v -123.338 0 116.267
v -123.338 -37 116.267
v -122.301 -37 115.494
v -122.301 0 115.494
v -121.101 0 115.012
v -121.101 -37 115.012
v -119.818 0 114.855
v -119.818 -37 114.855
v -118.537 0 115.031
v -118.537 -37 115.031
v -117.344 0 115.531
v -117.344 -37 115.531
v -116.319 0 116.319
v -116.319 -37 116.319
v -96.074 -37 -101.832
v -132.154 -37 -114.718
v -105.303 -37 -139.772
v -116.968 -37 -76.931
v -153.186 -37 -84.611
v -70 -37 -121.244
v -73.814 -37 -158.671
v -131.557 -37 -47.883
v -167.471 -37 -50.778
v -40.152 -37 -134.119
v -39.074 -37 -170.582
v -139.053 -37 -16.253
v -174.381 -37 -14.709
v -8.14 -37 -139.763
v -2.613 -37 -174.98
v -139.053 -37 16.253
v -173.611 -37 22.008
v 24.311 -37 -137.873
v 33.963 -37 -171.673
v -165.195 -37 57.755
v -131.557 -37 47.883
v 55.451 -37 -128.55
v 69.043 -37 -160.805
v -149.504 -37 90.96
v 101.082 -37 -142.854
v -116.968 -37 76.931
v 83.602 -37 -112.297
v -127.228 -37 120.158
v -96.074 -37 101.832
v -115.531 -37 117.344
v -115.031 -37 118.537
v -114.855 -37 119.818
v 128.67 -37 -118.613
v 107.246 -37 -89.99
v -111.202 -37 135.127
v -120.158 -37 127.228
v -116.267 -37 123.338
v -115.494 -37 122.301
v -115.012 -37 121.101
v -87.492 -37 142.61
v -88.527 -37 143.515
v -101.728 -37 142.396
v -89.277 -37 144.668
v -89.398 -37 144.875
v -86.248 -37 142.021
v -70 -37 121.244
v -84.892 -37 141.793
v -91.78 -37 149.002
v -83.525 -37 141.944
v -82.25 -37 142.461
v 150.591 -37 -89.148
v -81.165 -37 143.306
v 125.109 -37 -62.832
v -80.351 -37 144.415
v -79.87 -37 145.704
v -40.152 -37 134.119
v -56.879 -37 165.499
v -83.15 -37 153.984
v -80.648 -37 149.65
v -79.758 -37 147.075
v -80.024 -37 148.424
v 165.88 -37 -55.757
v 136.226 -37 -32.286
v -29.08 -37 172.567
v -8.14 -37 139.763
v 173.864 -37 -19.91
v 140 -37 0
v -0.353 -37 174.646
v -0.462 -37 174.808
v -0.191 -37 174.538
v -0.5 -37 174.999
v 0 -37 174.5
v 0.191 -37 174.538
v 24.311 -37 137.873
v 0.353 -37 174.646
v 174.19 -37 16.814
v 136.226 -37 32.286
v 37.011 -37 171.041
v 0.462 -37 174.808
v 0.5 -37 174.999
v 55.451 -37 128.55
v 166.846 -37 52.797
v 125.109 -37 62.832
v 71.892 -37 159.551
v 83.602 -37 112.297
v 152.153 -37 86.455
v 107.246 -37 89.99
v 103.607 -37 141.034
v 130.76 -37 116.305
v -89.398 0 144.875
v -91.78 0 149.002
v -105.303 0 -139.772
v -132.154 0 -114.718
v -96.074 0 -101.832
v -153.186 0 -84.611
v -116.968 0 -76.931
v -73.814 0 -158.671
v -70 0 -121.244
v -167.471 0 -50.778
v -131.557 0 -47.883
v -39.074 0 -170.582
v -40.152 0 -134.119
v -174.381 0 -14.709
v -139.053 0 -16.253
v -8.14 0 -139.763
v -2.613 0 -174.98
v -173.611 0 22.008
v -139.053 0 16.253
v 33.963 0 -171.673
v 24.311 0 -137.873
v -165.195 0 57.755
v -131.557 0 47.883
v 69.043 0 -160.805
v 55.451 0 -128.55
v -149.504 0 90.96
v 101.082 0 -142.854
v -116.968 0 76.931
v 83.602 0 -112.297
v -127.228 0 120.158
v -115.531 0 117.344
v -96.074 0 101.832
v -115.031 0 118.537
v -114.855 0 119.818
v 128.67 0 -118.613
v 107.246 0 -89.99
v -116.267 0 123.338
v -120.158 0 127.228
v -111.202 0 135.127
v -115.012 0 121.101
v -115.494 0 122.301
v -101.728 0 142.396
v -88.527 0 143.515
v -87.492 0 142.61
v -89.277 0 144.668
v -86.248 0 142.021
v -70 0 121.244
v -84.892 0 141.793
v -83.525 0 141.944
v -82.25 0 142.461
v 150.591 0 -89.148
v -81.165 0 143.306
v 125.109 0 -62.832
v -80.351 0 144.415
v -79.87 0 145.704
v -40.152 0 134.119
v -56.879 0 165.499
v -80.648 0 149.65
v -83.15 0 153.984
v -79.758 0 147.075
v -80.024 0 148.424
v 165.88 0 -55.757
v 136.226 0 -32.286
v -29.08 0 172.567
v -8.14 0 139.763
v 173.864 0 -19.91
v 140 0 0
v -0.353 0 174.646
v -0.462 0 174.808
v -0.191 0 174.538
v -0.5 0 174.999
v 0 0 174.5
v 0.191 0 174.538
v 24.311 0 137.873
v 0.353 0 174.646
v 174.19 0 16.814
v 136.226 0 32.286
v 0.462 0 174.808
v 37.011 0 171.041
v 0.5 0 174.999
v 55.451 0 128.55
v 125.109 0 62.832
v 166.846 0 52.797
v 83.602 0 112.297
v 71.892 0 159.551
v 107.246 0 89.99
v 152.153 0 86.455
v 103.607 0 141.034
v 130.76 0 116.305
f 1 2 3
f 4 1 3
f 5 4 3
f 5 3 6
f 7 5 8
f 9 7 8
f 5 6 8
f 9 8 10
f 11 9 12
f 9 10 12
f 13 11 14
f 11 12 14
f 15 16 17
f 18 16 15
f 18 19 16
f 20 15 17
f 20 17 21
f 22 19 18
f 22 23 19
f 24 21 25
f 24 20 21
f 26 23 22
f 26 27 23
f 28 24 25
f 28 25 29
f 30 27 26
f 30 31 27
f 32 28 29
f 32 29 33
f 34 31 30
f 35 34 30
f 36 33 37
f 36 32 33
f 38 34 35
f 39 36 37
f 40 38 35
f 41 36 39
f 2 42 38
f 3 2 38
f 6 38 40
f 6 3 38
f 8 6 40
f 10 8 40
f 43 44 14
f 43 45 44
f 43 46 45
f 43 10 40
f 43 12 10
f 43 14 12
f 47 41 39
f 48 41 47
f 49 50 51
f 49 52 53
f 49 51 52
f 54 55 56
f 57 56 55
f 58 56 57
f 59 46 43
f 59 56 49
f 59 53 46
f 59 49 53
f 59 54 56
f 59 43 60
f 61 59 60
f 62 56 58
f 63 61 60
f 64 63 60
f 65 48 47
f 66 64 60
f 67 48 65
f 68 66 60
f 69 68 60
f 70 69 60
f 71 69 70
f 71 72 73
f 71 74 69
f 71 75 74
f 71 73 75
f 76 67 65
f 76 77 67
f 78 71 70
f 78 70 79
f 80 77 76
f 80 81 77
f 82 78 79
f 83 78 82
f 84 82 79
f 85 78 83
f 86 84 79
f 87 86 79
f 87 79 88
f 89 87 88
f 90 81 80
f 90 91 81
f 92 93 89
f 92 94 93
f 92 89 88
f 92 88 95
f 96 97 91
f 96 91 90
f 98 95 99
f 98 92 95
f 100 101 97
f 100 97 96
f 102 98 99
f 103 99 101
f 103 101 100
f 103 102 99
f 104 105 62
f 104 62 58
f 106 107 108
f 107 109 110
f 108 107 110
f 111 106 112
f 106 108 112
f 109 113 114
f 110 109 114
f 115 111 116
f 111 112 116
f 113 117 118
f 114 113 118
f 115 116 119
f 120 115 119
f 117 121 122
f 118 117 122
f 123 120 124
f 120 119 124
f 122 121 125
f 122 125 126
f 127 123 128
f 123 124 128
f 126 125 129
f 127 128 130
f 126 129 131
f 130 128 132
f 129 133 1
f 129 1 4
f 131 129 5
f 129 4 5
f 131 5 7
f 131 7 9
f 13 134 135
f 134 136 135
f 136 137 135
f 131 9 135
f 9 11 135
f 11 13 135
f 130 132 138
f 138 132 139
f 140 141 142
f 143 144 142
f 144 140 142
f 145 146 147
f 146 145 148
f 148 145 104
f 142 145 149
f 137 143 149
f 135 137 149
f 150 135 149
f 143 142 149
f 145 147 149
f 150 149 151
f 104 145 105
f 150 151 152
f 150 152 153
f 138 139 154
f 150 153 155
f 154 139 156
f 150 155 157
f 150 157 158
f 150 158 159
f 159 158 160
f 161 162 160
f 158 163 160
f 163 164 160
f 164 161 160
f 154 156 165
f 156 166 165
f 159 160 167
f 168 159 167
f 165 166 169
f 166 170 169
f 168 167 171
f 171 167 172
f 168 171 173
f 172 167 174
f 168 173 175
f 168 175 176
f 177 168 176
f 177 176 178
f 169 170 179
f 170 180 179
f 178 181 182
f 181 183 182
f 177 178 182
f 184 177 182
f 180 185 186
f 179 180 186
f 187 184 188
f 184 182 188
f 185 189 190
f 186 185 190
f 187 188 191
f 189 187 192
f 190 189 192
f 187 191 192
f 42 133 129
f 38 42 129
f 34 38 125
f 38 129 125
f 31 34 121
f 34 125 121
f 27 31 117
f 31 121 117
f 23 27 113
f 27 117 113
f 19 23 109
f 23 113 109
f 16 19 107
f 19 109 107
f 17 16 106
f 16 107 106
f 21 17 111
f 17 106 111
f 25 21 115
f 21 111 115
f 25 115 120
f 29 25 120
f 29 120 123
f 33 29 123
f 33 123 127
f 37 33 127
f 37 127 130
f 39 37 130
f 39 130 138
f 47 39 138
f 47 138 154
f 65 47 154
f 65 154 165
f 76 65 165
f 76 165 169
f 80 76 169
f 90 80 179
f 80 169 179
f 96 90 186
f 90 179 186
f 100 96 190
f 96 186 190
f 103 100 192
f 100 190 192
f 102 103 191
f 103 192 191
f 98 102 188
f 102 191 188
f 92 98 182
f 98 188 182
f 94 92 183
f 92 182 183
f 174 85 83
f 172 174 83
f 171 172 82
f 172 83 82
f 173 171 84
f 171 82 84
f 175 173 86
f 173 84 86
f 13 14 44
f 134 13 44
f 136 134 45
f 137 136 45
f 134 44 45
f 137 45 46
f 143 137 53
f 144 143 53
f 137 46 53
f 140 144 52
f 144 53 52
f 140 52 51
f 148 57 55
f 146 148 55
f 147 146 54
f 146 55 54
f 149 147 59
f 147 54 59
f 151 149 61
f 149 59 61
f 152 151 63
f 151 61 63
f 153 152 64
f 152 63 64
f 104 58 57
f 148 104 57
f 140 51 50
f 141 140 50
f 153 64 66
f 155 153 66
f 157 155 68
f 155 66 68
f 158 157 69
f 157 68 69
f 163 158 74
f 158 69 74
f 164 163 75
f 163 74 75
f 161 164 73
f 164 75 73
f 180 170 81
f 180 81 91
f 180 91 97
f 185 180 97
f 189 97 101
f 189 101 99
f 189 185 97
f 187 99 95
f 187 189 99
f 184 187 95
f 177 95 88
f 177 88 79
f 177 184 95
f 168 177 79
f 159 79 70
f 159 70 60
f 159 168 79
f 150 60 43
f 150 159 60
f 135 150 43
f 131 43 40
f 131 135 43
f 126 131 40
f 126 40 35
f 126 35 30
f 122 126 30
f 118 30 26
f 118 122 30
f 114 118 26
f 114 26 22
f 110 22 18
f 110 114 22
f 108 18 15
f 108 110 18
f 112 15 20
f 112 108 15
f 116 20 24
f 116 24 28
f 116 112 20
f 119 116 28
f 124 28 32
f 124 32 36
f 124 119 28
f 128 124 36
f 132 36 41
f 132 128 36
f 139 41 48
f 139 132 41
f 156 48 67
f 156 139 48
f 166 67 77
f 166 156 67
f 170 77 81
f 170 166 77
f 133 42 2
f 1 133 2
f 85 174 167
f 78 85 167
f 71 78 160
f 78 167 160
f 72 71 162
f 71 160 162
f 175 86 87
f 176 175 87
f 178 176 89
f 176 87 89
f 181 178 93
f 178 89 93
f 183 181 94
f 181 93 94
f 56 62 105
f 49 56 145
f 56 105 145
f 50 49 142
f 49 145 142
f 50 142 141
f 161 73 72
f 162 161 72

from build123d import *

# Parameters (mm, degrees)
F0_R     = 175
F0_R_2   = 140
F1_DEPTH = 37
F3_DEPTH = 64
F4_DEPTH = 40


with BuildPart() as f1:
    # F0 (on Front) → F1 (new body)
    with BuildSketch(Plane.XZ):
        Circle(F0_R)
        Circle(F0_R_2, mode=Mode.SUBTRACT)
    extrude(amount=F1_DEPTH)

    # F2 (on face) → F3 (cut)
    with BuildSketch(Plane.XZ.offset(37)):
        with BuildLine():
            Line((-134.6558720136, 127.5854463967), (-127.2283504649, 120.158007798))
            ThreePointArc((-127.2283504649, 120.158007798), (-123.7436867076, 123.7436867076), (-120.158007798, 127.2283504649))
            Line((-120.158007798, 127.2283504649), (-127.5854463967, 134.6558720136))
            ThreePointArc((-127.5854463967, 134.6558720136), (-134.703841816, 134.703841816), (-134.6558720136, 127.5854463967))
        make_face()
        with BuildLine():
            ThreePointArc((-123.3376217614, 116.267322546), (-119.8177388722, 114.8547352829), (-116.3190655052, 116.3190655052))
            ThreePointArc((-116.3190655052, 116.3190655052), (-114.8547352829, 119.8177388722), (-116.267322546, 123.3376217614))
            Line((-116.267322546, 123.3376217614), (-120.158007798, 127.2283504649))
            ThreePointArc((-120.158007798, 127.2283504649), (-123.7436867076, 123.7436867076), (-127.2283504649, 120.158007798))
            Line((-127.2283504649, 120.158007798), (-123.3376217614, 116.267322546))
        make_face()
        with BuildLine():
            ThreePointArc((-89.2769447092, 144.6683901164), (-86.2483562751, 142.021093318), (-82.25, 142.4611789225))
            ThreePointArc((-82.25, 142.4611789225), (-79.8696965491, 145.7038142279), (-80.6480286108, 149.6502971486))
            Line((-80.6480286108, 149.6502971486), (-83.1500538847, 153.9839879305))
            ThreePointArc((-83.1500538847, 153.9839879305), (-87.5003449373, 151.5542465121), (-91.7796966371, 149.0016351762))
            Line((-91.7796966372, 149.0016351762), (-89.397566175, 144.8749948502))
            Line((-89.397566175, 144.8749948502), (-89.2769447092, 144.6683901164))
        make_face()
    extrude(amount=-F3_DEPTH, mode=Mode.SUBTRACT)

    # F2 (on face) → F4 (cut)
    with BuildSketch(Plane.XZ.offset(37)):
        with BuildLine():
            ThreePointArc((0.5, 175), (-0.3535533906, 175.3535533906), (0, 174.5))
            ThreePointArc((0, 174.5), (0.3535533906, 174.6464466094), (0.5, 175))
        make_face()
        with BuildLine():
            ThreePointArc((-123.3376217614, 116.267322546), (-119.8177388722, 114.8547352829), (-116.3190655052, 116.3190655052))
            ThreePointArc((-116.3190655052, 116.3190655052), (-114.8547352829, 119.8177388722), (-116.267322546, 123.3376217614))
            Line((-116.267322546, 123.3376217614), (-127.5854463967, 134.6558720136))
            ThreePointArc((-127.5854463967, 134.6558720136), (-134.703841816, 134.703841816), (-134.6558720136, 127.5854463967))
            Line((-134.6558720136, 127.5854463967), (-123.3376217614, 116.267322546))
        make_face()
    extrude(amount=-F4_DEPTH, mode=Mode.SUBTRACT)


solid = f1.part
